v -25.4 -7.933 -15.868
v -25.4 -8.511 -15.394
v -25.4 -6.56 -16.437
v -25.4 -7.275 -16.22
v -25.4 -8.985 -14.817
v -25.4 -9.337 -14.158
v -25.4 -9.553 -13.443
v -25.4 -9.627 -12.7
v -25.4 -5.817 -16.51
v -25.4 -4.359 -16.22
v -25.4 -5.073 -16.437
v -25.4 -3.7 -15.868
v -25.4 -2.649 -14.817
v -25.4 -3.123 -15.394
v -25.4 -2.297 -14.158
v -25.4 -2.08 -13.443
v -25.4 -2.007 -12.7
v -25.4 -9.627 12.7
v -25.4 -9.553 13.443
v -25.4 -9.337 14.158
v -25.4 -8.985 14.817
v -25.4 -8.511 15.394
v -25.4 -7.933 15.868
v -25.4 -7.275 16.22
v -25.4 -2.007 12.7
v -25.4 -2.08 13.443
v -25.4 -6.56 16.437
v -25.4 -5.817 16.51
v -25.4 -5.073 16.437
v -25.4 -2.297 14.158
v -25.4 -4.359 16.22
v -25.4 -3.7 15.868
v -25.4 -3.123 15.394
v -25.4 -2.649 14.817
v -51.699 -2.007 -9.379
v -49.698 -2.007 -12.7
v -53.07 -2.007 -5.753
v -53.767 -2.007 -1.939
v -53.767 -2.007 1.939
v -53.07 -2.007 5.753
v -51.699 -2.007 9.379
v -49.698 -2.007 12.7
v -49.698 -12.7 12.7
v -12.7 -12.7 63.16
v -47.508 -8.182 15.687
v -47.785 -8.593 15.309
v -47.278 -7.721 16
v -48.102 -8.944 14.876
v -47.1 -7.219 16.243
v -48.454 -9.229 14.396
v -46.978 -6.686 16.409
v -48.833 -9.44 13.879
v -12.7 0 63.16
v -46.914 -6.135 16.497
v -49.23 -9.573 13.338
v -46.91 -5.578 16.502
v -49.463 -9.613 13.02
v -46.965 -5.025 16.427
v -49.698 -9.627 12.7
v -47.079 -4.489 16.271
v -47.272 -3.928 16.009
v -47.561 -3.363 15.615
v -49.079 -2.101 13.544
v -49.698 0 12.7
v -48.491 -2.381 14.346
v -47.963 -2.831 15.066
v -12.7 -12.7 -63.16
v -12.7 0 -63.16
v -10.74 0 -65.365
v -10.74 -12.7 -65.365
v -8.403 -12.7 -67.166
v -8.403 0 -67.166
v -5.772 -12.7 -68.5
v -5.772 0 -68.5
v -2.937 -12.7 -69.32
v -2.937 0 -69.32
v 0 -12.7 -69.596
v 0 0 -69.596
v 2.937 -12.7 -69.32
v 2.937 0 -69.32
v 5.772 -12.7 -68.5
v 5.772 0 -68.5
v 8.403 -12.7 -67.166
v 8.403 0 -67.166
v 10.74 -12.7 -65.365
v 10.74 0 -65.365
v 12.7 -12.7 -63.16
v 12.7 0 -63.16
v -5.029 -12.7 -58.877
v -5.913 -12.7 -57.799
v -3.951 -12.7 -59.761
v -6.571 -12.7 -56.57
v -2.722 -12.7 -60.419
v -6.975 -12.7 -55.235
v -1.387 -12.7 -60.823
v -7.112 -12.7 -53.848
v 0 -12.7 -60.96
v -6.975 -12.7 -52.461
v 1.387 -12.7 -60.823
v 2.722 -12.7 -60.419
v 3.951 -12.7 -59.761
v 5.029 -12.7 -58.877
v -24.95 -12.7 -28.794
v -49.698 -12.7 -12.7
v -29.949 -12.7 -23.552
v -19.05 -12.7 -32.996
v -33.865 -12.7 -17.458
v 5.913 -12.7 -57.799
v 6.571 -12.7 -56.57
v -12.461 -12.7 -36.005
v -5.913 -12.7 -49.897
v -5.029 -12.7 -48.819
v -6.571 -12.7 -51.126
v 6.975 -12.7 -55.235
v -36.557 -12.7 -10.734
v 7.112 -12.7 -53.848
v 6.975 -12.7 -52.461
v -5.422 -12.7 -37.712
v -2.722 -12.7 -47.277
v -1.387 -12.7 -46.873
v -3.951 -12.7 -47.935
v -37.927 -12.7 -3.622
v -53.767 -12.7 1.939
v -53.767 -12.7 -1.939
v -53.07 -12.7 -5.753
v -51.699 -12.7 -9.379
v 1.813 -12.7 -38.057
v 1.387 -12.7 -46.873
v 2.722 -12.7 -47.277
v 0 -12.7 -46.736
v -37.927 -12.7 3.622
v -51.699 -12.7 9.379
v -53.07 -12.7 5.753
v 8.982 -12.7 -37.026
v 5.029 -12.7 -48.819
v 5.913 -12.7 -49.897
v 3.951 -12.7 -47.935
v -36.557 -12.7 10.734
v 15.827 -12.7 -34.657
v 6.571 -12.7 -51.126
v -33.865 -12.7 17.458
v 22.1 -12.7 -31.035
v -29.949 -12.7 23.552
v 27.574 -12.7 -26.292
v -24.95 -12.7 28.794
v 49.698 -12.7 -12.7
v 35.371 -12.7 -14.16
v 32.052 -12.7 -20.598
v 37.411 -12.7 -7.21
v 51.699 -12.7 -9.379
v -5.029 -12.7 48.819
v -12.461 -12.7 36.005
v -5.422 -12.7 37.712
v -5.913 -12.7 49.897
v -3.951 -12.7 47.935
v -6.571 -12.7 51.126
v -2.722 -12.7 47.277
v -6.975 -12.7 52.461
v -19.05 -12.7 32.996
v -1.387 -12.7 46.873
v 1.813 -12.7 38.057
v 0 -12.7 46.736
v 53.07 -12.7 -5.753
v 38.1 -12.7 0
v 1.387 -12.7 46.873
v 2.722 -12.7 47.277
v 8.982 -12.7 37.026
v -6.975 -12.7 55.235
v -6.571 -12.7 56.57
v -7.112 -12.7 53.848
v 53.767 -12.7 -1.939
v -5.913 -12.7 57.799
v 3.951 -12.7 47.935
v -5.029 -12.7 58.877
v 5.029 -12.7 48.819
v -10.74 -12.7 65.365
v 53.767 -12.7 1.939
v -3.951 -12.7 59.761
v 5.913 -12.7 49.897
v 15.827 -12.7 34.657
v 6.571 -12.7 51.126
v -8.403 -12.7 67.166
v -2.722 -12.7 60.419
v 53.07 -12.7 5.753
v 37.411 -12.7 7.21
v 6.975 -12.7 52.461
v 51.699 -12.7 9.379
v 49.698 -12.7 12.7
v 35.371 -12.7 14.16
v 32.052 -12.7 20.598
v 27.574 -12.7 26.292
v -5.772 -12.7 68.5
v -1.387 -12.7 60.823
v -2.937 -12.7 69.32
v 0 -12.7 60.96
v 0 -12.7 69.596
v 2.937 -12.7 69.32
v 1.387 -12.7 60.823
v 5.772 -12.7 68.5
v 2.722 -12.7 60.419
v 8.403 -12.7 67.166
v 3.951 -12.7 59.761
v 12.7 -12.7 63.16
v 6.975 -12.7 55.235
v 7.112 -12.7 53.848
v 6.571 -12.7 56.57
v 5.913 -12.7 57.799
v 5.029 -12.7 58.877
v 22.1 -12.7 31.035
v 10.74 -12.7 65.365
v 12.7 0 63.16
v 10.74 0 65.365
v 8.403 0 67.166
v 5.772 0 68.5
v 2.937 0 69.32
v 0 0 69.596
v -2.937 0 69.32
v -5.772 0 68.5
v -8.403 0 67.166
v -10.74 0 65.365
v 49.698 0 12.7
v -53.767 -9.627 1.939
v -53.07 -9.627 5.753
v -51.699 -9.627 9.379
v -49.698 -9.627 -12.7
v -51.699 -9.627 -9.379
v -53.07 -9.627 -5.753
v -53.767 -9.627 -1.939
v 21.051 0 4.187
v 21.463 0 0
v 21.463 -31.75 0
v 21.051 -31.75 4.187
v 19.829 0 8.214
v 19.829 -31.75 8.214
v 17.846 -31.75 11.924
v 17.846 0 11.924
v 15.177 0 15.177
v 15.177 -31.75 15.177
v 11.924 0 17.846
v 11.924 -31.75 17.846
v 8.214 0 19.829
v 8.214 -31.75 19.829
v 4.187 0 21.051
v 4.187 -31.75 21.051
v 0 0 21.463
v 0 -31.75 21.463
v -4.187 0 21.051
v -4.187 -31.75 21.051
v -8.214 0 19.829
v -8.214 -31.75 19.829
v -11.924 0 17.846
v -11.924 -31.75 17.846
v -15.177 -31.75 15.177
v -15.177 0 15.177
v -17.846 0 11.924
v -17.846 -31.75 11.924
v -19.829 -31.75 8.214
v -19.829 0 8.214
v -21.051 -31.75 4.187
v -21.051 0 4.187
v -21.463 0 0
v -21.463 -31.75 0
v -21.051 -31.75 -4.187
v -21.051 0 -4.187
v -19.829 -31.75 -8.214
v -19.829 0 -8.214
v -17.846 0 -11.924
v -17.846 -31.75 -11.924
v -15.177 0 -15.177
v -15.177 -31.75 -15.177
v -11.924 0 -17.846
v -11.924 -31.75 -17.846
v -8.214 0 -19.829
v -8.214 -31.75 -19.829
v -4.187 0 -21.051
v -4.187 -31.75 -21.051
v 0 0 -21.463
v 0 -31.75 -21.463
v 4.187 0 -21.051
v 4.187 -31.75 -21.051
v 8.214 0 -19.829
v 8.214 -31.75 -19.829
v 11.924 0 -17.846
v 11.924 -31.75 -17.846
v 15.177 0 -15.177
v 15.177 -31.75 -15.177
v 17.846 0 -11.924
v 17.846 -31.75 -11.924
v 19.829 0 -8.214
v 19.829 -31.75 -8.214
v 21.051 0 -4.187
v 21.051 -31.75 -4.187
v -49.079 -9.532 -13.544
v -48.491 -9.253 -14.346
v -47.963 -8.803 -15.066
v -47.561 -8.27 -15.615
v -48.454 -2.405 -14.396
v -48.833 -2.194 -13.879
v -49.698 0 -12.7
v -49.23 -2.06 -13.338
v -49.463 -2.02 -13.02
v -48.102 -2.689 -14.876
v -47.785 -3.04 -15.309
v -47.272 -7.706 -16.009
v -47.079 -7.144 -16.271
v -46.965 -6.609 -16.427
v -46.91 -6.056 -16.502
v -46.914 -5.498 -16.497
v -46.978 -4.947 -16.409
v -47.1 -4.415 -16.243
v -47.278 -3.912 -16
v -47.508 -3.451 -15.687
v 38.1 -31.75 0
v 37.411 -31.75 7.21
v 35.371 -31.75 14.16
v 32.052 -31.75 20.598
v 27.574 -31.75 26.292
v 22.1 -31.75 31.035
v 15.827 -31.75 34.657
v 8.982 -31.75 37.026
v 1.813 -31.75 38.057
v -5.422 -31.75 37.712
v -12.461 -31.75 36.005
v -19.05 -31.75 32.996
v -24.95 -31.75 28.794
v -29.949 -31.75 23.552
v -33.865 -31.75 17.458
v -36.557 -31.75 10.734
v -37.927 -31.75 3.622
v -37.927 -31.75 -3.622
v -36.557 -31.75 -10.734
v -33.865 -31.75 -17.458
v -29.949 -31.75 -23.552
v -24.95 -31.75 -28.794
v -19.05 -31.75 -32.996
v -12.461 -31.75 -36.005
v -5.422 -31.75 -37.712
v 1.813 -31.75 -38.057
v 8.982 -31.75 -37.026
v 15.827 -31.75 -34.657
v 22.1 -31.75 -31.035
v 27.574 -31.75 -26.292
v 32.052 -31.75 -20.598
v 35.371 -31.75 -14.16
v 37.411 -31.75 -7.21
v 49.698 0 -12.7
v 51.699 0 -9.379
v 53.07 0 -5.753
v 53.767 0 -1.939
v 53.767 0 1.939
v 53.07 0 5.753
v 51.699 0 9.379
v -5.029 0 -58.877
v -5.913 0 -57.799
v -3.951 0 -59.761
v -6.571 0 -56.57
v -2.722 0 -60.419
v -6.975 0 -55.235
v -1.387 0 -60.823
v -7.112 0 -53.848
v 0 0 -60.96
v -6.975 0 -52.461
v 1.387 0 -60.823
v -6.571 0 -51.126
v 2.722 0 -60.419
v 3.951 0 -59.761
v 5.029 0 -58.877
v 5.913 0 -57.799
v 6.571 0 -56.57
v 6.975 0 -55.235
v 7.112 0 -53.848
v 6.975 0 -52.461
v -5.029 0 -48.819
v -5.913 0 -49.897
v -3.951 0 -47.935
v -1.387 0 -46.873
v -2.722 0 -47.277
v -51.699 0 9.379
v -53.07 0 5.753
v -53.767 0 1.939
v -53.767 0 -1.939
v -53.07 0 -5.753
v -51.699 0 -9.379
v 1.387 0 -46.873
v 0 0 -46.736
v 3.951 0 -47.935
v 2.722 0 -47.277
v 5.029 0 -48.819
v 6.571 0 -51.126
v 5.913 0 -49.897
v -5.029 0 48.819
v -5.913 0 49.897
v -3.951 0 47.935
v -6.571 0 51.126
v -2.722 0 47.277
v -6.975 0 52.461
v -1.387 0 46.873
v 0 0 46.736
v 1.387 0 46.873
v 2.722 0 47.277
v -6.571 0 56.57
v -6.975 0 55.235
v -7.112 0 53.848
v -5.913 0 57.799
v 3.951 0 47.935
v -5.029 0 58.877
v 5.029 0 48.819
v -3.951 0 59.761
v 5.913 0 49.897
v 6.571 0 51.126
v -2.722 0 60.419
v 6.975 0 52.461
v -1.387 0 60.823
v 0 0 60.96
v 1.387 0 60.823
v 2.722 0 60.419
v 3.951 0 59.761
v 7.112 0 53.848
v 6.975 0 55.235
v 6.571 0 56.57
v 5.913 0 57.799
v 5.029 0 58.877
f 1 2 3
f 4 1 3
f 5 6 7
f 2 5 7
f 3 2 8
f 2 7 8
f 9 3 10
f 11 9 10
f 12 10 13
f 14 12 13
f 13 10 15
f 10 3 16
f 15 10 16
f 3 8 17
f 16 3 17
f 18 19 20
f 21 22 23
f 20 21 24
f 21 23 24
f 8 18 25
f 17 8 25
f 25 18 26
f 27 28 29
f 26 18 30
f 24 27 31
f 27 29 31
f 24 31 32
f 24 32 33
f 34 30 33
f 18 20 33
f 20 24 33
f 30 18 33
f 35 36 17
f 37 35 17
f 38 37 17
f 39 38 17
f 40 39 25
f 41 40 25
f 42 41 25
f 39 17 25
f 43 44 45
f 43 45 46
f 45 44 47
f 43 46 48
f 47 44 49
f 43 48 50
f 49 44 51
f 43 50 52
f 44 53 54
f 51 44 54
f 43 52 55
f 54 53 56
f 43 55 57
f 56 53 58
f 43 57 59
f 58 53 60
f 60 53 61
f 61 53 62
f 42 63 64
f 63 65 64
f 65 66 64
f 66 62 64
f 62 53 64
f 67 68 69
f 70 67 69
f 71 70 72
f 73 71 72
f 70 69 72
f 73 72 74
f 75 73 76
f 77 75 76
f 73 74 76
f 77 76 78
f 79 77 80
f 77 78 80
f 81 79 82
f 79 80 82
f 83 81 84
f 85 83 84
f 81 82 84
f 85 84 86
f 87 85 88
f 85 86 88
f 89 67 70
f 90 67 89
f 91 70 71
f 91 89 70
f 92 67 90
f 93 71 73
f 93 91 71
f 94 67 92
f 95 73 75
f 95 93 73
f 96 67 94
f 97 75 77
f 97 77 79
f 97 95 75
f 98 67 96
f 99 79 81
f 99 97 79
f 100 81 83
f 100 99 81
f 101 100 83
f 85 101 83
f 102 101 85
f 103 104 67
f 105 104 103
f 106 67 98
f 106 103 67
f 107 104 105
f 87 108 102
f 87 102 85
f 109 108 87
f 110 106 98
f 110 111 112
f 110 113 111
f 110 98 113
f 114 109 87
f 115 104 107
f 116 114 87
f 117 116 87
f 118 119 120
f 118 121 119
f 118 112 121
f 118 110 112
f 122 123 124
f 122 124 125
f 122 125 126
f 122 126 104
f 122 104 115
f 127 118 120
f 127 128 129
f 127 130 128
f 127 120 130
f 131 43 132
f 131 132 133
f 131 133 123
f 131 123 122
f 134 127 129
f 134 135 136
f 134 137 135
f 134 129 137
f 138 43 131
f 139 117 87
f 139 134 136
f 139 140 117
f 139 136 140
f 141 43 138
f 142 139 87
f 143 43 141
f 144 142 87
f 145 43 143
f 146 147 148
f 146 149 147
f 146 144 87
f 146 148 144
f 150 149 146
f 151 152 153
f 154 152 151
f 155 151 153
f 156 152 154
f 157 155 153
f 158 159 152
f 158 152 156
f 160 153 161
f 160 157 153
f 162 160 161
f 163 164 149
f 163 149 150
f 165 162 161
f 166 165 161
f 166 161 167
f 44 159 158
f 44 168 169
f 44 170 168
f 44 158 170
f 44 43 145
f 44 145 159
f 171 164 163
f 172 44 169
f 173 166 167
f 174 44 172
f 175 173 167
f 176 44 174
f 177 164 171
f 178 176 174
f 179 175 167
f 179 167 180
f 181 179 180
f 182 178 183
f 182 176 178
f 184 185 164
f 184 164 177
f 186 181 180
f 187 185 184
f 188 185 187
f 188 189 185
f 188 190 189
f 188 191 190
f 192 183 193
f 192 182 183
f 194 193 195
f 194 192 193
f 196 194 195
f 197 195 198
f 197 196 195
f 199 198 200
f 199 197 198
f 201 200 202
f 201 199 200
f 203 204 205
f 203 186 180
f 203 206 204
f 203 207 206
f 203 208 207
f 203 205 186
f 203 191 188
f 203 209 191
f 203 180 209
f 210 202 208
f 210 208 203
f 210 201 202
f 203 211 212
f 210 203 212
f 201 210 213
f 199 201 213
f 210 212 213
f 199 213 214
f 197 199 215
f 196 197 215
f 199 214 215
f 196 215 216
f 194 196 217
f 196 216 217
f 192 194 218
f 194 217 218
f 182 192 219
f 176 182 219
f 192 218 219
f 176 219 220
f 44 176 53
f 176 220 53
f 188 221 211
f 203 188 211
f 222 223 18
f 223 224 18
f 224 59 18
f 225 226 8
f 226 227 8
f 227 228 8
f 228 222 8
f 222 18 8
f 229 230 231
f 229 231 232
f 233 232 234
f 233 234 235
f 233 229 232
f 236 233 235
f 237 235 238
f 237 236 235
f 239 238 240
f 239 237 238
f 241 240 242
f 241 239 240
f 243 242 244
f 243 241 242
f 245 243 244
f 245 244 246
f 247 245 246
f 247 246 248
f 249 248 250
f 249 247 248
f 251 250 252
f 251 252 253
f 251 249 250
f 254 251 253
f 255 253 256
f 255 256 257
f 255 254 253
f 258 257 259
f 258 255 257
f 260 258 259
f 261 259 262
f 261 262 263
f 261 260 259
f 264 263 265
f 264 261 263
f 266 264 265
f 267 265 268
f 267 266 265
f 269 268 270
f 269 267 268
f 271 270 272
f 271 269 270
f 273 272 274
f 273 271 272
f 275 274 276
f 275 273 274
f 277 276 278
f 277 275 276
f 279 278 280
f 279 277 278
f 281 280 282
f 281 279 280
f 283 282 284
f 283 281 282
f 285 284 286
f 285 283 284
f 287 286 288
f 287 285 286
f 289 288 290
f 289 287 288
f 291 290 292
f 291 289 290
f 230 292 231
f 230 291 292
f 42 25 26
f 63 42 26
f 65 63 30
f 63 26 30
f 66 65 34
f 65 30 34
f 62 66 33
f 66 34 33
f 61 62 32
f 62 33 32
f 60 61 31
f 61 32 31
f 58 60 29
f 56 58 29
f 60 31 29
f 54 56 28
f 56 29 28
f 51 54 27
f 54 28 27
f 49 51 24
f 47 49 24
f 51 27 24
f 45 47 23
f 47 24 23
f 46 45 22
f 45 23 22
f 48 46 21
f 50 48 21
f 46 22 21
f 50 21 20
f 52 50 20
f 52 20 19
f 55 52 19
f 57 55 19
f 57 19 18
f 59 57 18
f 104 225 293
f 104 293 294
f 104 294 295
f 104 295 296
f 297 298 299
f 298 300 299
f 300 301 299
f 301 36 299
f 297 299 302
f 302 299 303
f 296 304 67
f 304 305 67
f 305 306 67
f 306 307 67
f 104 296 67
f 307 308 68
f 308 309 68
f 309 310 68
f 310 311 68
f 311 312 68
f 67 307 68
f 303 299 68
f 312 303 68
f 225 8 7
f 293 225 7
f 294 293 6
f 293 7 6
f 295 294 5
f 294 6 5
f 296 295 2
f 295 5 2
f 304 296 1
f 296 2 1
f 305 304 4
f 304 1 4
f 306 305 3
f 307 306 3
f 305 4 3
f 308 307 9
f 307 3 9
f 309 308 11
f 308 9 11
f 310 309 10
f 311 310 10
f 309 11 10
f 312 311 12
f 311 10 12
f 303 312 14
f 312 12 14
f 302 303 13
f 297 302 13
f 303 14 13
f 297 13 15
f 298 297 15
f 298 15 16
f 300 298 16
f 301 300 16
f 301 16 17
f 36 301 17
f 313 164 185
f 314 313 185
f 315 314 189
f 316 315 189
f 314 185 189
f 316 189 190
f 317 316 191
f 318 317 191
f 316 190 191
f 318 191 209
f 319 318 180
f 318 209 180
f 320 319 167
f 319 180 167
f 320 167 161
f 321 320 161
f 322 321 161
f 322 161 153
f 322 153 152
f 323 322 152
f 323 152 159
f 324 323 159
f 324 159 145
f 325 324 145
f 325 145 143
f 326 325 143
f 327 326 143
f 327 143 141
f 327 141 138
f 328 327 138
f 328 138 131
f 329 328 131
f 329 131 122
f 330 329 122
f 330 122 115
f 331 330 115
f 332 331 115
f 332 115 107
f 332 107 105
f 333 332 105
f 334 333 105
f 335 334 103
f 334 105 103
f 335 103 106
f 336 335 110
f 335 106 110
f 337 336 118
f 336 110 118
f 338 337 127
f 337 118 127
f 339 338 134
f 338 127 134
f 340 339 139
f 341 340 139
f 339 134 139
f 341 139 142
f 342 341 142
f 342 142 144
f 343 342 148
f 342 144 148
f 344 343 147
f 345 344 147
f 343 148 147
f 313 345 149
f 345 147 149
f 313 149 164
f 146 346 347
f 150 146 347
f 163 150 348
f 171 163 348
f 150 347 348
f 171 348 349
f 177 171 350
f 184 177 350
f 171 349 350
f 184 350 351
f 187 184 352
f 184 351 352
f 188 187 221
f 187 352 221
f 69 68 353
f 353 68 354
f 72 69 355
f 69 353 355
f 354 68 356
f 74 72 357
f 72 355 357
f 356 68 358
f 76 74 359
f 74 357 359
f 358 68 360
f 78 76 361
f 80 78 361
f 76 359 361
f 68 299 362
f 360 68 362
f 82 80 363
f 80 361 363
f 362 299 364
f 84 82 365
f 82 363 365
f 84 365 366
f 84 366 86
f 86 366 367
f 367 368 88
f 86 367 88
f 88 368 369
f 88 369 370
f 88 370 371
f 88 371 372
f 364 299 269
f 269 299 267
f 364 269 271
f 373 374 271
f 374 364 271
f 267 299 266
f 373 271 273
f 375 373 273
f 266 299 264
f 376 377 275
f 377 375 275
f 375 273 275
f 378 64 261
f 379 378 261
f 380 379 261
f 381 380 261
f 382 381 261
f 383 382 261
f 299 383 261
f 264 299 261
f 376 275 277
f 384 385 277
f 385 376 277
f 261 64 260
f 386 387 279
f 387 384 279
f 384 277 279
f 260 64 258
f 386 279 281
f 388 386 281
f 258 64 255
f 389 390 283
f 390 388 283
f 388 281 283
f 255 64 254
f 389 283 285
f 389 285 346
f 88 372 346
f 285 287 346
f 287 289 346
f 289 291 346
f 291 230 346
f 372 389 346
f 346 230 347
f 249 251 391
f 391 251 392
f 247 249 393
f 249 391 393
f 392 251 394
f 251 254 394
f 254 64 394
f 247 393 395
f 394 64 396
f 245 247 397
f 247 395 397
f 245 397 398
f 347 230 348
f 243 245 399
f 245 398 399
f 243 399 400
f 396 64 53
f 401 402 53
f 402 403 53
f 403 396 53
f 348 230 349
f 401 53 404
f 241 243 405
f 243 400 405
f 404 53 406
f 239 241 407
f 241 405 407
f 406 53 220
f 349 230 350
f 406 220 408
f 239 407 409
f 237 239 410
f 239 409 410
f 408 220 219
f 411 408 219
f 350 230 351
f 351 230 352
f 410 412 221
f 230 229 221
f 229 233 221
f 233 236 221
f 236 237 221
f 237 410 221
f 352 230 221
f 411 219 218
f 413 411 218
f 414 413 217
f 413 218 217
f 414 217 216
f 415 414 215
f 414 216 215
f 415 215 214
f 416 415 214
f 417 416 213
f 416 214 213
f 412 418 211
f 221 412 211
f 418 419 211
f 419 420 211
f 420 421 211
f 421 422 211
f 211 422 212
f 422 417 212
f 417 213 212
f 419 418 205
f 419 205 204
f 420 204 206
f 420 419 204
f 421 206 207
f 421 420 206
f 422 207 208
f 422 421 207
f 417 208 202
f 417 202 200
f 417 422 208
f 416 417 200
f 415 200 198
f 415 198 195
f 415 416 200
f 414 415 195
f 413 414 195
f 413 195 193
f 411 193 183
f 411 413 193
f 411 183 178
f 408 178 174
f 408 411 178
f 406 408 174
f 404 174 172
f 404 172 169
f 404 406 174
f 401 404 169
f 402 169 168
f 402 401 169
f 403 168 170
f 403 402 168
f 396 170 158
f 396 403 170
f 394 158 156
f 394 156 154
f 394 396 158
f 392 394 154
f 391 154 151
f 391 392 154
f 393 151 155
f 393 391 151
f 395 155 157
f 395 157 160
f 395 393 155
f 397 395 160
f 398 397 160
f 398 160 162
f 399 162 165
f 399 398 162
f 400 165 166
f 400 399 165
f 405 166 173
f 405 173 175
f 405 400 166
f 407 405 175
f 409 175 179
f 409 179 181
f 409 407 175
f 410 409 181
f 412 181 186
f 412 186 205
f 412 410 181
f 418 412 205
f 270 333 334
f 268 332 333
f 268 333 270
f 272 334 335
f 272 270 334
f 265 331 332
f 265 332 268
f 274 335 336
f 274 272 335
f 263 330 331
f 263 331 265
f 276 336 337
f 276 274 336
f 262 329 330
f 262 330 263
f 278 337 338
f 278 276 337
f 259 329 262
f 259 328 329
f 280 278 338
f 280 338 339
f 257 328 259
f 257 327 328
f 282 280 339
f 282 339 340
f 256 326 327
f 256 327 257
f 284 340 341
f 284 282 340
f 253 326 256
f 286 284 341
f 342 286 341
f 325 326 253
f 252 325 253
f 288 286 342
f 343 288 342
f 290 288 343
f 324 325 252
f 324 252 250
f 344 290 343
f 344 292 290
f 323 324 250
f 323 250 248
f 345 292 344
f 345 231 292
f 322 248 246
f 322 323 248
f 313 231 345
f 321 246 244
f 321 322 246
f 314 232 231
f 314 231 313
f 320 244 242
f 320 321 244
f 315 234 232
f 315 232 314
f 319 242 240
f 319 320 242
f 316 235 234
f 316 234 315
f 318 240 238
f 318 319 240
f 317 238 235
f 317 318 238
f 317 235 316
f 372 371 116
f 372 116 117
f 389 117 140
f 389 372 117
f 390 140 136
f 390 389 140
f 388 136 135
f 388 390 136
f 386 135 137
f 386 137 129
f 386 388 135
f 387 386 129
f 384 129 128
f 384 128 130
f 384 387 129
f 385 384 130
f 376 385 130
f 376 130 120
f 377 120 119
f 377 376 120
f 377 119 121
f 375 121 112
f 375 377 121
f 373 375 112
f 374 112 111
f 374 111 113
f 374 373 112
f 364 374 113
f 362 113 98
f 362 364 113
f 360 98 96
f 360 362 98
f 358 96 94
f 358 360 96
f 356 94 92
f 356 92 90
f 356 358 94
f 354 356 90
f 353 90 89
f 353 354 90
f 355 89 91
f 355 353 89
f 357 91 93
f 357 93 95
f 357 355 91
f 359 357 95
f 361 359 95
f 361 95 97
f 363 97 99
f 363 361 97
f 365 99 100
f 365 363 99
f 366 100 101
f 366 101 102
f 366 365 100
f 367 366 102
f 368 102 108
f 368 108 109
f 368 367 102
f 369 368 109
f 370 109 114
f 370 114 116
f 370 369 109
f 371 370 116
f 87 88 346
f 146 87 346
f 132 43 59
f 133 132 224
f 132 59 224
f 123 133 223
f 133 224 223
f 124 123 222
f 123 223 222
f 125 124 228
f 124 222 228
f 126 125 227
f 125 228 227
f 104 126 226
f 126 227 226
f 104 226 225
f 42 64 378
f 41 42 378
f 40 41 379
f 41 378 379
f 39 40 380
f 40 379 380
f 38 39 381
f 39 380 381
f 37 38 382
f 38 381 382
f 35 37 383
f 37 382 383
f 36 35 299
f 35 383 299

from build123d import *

# Parameters (mm, degrees)
F0_R     = 7.112
F0_R_2   = 38.1
F1_DEPTH = 12.7
F0_R_3   = 21.463
F2_DEPTH = 31.75
F4_START = -25.4
F4_DEPTH = 31.75


with BuildPart() as f1:
    # F0 (on Front) → F1 (new body)
    with BuildSketch(Plane.XZ):
        with BuildLine():
            ThreePointArc((12.7, 63.1597938122), (0, 69.596), (-12.7, 63.1597938122))
            Line((-12.7, 63.1597938122), (-49.6977319514, 12.7))
            ThreePointArc((-49.6977319514, 12.7), (-53.8547827604, 0), (-49.6977319514, -12.7))
            Line((-49.6977319514, -12.7), (-12.7, -63.1597938122))
            ThreePointArc((-12.7, -63.1597938122), (0, -69.596), (12.7, -63.1597938122))
            Line((12.7, -63.1597938122), (49.6977319514, -12.7))
            ThreePointArc((49.6977319514, -12.7), (53.8547827604, 0), (49.6977319514, 12.7))
            Line((49.6977319514, 12.7), (12.7, 63.1597938122))
        make_face()
        with Locations((0, -53.848)):
            Circle(F0_R, mode=Mode.SUBTRACT)
        Circle(F0_R_2, mode=Mode.SUBTRACT)
        with Locations((0, 53.848)):
            Circle(F0_R, mode=Mode.SUBTRACT)
    extrude(amount=F1_DEPTH)

    # F0 (on Front) → F2 (join)
    with BuildSketch(Plane.XZ):
        Circle(F0_R_2)
        Circle(F0_R_3, mode=Mode.SUBTRACT)
    extrude(amount=F2_DEPTH)

    # F3 (on Right) → F4 (cut)
    with BuildSketch(Plane.YZ.offset(F4_START)):
        with BuildLine():
            Line((-2.0067014742, -12.7), (-2.0067014742, 12.7))
            ThreePointArc((-2.0067014742, 12.7), (-5.8167014742, 16.51), (-9.6267014742, 12.7))
            Line((-9.6267014742, 12.7), (-9.6267014742, -12.7))
            ThreePointArc((-9.6267014742, -12.7), (-5.8167014742, -16.51), (-2.0067014742, -12.7))
        make_face()
    extrude(amount=-F4_DEPTH, mode=Mode.SUBTRACT)


solid = f1.part
